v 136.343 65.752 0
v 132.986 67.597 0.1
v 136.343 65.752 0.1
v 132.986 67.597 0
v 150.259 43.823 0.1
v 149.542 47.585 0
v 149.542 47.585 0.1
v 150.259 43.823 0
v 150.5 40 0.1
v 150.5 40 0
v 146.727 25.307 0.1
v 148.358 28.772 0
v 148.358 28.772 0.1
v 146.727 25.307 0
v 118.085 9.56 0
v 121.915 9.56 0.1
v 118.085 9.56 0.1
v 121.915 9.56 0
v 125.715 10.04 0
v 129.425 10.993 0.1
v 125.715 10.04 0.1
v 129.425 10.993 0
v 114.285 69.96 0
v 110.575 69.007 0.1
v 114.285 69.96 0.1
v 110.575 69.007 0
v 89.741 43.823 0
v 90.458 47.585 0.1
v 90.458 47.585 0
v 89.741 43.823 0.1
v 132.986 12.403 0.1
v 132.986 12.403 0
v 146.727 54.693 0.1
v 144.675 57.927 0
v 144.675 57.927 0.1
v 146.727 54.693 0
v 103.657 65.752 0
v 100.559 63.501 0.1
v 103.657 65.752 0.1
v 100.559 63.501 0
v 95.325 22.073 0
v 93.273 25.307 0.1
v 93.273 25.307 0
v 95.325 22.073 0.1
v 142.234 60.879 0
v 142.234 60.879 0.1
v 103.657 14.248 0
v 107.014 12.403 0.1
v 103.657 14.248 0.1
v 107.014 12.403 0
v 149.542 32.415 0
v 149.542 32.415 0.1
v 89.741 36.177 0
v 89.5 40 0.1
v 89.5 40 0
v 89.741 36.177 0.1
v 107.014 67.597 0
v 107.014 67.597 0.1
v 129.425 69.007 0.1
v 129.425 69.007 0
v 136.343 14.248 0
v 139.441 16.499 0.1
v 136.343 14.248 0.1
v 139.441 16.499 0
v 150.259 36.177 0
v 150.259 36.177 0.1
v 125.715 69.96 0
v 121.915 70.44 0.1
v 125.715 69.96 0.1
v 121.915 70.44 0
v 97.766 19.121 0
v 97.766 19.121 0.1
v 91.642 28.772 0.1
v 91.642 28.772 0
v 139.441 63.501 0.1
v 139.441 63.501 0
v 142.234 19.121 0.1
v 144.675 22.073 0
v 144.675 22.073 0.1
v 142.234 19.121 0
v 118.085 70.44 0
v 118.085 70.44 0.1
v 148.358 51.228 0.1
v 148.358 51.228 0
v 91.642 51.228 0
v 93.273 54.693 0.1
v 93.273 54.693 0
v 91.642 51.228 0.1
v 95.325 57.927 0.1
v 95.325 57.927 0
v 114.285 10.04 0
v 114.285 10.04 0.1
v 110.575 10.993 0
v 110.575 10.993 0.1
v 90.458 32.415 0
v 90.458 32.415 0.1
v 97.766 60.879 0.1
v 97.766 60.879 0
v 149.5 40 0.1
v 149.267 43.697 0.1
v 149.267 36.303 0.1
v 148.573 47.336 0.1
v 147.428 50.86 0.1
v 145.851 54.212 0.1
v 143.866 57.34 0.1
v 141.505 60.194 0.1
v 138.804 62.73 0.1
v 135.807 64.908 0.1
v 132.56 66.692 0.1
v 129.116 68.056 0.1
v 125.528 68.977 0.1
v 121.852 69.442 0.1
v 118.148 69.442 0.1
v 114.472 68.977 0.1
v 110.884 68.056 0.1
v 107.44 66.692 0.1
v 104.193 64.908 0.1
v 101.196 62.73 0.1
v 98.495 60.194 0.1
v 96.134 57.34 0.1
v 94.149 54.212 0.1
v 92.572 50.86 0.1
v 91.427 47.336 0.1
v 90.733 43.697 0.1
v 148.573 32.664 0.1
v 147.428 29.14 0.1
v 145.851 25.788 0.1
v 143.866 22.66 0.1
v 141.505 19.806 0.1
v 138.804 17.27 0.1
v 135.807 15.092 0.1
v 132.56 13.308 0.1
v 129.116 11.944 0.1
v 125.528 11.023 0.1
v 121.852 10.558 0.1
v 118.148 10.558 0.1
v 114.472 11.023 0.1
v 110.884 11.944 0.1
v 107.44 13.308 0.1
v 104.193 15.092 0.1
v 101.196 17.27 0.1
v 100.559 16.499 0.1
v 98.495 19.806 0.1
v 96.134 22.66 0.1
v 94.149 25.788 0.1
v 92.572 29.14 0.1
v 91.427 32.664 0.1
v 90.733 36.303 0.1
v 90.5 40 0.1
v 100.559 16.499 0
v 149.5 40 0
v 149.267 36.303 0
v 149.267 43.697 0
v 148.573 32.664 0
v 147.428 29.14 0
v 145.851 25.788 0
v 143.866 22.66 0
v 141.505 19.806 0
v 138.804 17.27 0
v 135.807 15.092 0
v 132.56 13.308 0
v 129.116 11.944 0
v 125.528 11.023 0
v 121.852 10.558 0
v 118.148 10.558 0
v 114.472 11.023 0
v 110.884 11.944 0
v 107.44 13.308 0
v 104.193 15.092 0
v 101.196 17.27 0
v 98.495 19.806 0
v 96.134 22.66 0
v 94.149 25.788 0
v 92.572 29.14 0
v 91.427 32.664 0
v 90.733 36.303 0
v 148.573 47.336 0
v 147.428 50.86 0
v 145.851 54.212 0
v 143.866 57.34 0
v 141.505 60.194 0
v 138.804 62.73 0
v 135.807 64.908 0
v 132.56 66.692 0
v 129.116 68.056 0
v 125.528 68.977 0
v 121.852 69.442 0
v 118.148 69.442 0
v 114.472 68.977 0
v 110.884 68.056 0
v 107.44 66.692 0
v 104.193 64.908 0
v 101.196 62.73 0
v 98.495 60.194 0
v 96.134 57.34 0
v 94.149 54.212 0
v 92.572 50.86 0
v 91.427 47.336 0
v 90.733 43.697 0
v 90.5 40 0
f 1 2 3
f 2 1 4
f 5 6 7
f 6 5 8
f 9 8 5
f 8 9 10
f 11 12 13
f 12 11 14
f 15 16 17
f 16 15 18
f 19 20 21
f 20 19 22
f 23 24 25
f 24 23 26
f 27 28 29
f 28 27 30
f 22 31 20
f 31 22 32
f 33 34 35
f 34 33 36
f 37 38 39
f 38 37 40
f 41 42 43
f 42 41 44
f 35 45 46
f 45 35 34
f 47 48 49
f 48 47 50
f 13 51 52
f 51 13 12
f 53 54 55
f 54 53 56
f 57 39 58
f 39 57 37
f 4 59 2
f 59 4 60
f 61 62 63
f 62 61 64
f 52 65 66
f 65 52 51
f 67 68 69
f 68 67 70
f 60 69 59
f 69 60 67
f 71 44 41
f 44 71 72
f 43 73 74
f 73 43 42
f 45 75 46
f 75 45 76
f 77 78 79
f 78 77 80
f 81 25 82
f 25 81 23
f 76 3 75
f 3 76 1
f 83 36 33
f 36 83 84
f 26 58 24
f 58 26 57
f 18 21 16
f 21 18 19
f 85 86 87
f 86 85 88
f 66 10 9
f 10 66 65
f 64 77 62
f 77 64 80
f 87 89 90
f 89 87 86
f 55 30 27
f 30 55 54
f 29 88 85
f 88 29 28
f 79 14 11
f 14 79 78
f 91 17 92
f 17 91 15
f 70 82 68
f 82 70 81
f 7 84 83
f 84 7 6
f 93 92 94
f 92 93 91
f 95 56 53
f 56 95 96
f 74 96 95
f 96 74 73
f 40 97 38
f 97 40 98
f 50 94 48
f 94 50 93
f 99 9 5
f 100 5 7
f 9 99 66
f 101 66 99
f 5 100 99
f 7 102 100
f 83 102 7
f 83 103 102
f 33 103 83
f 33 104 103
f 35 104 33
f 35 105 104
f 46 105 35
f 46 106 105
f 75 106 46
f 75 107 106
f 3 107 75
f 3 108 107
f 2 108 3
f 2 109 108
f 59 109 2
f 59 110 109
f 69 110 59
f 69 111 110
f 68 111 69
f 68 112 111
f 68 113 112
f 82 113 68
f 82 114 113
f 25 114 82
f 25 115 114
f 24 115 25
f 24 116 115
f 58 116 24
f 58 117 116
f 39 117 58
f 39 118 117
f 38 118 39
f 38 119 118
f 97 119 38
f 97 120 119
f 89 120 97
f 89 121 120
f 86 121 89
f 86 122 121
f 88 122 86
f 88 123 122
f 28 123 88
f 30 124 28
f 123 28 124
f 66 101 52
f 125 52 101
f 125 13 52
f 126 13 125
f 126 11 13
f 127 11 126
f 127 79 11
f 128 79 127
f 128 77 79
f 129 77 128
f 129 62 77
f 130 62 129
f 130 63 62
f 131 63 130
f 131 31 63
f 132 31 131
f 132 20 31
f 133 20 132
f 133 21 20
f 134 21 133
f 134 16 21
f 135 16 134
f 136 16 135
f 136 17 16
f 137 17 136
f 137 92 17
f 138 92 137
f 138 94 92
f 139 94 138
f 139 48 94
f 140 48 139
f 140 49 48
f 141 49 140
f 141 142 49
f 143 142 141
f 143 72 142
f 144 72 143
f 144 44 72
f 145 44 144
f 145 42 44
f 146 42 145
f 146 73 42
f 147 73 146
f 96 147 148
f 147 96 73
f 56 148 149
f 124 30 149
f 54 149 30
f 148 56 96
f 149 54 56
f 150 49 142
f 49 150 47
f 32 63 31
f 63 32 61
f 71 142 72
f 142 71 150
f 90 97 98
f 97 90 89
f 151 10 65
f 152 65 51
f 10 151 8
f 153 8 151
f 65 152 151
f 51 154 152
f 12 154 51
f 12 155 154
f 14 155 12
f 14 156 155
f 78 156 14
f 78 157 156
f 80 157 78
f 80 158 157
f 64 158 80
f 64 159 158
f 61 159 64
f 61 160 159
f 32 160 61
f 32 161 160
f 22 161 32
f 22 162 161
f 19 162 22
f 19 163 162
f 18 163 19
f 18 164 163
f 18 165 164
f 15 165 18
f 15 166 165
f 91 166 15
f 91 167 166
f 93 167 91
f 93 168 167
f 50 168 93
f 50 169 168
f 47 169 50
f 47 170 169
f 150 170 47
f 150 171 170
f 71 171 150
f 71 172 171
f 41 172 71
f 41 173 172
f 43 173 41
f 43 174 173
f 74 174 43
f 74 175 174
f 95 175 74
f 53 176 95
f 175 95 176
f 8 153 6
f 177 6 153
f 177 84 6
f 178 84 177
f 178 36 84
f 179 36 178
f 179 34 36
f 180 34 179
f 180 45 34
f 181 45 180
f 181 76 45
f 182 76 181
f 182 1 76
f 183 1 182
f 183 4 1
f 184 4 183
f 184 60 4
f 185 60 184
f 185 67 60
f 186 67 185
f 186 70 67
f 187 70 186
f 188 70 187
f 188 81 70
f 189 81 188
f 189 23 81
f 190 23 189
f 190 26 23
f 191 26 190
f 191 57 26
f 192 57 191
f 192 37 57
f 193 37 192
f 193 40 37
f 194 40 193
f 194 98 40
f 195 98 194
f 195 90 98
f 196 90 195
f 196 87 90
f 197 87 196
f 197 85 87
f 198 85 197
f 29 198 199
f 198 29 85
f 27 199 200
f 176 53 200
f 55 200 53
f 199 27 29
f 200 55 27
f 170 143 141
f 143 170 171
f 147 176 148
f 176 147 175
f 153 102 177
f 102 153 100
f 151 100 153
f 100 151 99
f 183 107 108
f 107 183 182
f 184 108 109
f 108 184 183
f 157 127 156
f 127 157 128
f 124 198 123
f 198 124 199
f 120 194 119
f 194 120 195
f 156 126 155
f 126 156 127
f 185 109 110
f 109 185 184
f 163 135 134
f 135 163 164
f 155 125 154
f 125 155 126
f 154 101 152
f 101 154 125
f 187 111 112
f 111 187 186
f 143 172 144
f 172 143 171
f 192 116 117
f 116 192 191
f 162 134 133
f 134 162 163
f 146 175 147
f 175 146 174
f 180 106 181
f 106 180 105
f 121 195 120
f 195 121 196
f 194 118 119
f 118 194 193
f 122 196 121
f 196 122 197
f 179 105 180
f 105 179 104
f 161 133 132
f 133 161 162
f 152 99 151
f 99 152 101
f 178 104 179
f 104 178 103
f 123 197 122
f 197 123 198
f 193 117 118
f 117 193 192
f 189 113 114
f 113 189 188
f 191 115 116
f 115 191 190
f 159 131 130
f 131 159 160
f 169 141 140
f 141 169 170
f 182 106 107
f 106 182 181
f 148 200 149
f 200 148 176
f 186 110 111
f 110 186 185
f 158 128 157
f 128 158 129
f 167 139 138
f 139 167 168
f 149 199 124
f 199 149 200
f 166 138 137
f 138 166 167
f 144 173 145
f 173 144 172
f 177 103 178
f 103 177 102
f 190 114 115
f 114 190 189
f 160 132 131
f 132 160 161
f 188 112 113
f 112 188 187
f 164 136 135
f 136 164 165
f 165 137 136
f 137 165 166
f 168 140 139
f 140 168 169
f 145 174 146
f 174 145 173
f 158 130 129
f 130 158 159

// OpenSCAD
$fn=50;

module planar_circle(rd=50) {
  color(c=[0,0,0,1]) {
    difference() {
      cylinder(h=.1, r=rd+.5);
      translate([0,0,-.1]) cylinder(h=.3, r=rd-.5);
    };
  };
};

module segment(p,q) {
    dx=q[0]-p[0];
    dy=q[1]-p[1];
  rp = sqrt( pow( dx, 2) + pow(dy , 2));
  //  off = dx < 0 ? 180 : 0;
  long = atan2((q[1]-p[1]),(q[0]-p[0]));
    echo(rp, dx, dy, long);
  color(c=[0,0,0,1]) translate([p[0],p[1],0])  rotate([0,0,long]) rotate([0,90,0])  translate([0,0,rp/2]) cube([.1,1,rp], true);
}


//translate([100,40,0]) planar_circle(rad=30);

module hemisphere(x=0,y=0,rad=50) {
  translate([x,y,0]) {
    planar_circle(rd=rad);
    /*color(c=[1,0,0,.75]) {
      intersection() {
        sphere(r=rad);
        translate([0,0,2*rad-.1]) cube(4*rad, true);
      }
    }*/
  }
};

module tangent_cone(x1=0,y1=0,x2=100,y2=40,b=60, a=30) {
    dx=x2-x1;
    dy=y2-y1;
    d=sqrt(dx*dx+dy*dy);
    ux=dx/d;
    uy=dy/d;
    l=d*a/(b-a);
    s=(b-a)/d;
    c=cos(asin(s));
    t=s/c;
    segment(p=[x1-b*ux-uy*(b/c+b*t),y1-b*uy+ux*(b/c+b*t) ], q=[x2+l*ux,y2+l*uy]);
    segment(p=[x1-b*ux+uy*(b/c+b*t),y1-b*uy-ux*(b/c+b*t) ], q=[x2+l*ux,y2+l*uy]);
    color(c=[1,1,0,.5]) {
      translate([x1,y1,0]) {
        rotate([0,0,atan2((y2-y1),(x2-x1))]) {
          intersection() {
            rotate([0,90,0]) translate([0,0,-b]) cylinder(r1=b/c+b*t, r2=0, h=b+l+d);
            translate([0,0,2*(l+d)]) cube(4*(l+d), true);
          }
        }
      }
    }
  }
  
//hemisphere(x=0, y=0, rad=60);

hemisphere(x=120, y=40, rad=30);
  
//hemisphere(x=50, y=150, rad=15);

//tangent_cone(x1=0,y1=0, x2=120, y2=40, b=60, a=30);

//tangent_cone(x1=0,y1=0, x2=50, y2=150, b=60, a=15);
  
//tangent_cone(x1=120,y1=40, x2=50, y2=150, b=30, a=15);



  
/* translate([100,40,0]) color(c=[1,0,0,.75]) {
    intersection() {
        sphere(r=30);
        translate([-100,-100,0]) cube([200,200,200], false);
    }
}

a=30;
b=60;
d=sqrt(100*100 + 40*40);
l=d*a/(b-a);
c=cos(asin((b-a)/d));
s=(b-a)/d;

echo(a,b,d,l,c,s);

color(c=[1,1,0,.5]) {
    rotate([0,0,atan(.4)]) intersection() {
        rotate([0,90,0]) cylinder(r1=b/c, r2=0, h=l+d);
        translate([0,0,2*(l+d)]) cube(4*(l+d), true);
    }
}
*/
